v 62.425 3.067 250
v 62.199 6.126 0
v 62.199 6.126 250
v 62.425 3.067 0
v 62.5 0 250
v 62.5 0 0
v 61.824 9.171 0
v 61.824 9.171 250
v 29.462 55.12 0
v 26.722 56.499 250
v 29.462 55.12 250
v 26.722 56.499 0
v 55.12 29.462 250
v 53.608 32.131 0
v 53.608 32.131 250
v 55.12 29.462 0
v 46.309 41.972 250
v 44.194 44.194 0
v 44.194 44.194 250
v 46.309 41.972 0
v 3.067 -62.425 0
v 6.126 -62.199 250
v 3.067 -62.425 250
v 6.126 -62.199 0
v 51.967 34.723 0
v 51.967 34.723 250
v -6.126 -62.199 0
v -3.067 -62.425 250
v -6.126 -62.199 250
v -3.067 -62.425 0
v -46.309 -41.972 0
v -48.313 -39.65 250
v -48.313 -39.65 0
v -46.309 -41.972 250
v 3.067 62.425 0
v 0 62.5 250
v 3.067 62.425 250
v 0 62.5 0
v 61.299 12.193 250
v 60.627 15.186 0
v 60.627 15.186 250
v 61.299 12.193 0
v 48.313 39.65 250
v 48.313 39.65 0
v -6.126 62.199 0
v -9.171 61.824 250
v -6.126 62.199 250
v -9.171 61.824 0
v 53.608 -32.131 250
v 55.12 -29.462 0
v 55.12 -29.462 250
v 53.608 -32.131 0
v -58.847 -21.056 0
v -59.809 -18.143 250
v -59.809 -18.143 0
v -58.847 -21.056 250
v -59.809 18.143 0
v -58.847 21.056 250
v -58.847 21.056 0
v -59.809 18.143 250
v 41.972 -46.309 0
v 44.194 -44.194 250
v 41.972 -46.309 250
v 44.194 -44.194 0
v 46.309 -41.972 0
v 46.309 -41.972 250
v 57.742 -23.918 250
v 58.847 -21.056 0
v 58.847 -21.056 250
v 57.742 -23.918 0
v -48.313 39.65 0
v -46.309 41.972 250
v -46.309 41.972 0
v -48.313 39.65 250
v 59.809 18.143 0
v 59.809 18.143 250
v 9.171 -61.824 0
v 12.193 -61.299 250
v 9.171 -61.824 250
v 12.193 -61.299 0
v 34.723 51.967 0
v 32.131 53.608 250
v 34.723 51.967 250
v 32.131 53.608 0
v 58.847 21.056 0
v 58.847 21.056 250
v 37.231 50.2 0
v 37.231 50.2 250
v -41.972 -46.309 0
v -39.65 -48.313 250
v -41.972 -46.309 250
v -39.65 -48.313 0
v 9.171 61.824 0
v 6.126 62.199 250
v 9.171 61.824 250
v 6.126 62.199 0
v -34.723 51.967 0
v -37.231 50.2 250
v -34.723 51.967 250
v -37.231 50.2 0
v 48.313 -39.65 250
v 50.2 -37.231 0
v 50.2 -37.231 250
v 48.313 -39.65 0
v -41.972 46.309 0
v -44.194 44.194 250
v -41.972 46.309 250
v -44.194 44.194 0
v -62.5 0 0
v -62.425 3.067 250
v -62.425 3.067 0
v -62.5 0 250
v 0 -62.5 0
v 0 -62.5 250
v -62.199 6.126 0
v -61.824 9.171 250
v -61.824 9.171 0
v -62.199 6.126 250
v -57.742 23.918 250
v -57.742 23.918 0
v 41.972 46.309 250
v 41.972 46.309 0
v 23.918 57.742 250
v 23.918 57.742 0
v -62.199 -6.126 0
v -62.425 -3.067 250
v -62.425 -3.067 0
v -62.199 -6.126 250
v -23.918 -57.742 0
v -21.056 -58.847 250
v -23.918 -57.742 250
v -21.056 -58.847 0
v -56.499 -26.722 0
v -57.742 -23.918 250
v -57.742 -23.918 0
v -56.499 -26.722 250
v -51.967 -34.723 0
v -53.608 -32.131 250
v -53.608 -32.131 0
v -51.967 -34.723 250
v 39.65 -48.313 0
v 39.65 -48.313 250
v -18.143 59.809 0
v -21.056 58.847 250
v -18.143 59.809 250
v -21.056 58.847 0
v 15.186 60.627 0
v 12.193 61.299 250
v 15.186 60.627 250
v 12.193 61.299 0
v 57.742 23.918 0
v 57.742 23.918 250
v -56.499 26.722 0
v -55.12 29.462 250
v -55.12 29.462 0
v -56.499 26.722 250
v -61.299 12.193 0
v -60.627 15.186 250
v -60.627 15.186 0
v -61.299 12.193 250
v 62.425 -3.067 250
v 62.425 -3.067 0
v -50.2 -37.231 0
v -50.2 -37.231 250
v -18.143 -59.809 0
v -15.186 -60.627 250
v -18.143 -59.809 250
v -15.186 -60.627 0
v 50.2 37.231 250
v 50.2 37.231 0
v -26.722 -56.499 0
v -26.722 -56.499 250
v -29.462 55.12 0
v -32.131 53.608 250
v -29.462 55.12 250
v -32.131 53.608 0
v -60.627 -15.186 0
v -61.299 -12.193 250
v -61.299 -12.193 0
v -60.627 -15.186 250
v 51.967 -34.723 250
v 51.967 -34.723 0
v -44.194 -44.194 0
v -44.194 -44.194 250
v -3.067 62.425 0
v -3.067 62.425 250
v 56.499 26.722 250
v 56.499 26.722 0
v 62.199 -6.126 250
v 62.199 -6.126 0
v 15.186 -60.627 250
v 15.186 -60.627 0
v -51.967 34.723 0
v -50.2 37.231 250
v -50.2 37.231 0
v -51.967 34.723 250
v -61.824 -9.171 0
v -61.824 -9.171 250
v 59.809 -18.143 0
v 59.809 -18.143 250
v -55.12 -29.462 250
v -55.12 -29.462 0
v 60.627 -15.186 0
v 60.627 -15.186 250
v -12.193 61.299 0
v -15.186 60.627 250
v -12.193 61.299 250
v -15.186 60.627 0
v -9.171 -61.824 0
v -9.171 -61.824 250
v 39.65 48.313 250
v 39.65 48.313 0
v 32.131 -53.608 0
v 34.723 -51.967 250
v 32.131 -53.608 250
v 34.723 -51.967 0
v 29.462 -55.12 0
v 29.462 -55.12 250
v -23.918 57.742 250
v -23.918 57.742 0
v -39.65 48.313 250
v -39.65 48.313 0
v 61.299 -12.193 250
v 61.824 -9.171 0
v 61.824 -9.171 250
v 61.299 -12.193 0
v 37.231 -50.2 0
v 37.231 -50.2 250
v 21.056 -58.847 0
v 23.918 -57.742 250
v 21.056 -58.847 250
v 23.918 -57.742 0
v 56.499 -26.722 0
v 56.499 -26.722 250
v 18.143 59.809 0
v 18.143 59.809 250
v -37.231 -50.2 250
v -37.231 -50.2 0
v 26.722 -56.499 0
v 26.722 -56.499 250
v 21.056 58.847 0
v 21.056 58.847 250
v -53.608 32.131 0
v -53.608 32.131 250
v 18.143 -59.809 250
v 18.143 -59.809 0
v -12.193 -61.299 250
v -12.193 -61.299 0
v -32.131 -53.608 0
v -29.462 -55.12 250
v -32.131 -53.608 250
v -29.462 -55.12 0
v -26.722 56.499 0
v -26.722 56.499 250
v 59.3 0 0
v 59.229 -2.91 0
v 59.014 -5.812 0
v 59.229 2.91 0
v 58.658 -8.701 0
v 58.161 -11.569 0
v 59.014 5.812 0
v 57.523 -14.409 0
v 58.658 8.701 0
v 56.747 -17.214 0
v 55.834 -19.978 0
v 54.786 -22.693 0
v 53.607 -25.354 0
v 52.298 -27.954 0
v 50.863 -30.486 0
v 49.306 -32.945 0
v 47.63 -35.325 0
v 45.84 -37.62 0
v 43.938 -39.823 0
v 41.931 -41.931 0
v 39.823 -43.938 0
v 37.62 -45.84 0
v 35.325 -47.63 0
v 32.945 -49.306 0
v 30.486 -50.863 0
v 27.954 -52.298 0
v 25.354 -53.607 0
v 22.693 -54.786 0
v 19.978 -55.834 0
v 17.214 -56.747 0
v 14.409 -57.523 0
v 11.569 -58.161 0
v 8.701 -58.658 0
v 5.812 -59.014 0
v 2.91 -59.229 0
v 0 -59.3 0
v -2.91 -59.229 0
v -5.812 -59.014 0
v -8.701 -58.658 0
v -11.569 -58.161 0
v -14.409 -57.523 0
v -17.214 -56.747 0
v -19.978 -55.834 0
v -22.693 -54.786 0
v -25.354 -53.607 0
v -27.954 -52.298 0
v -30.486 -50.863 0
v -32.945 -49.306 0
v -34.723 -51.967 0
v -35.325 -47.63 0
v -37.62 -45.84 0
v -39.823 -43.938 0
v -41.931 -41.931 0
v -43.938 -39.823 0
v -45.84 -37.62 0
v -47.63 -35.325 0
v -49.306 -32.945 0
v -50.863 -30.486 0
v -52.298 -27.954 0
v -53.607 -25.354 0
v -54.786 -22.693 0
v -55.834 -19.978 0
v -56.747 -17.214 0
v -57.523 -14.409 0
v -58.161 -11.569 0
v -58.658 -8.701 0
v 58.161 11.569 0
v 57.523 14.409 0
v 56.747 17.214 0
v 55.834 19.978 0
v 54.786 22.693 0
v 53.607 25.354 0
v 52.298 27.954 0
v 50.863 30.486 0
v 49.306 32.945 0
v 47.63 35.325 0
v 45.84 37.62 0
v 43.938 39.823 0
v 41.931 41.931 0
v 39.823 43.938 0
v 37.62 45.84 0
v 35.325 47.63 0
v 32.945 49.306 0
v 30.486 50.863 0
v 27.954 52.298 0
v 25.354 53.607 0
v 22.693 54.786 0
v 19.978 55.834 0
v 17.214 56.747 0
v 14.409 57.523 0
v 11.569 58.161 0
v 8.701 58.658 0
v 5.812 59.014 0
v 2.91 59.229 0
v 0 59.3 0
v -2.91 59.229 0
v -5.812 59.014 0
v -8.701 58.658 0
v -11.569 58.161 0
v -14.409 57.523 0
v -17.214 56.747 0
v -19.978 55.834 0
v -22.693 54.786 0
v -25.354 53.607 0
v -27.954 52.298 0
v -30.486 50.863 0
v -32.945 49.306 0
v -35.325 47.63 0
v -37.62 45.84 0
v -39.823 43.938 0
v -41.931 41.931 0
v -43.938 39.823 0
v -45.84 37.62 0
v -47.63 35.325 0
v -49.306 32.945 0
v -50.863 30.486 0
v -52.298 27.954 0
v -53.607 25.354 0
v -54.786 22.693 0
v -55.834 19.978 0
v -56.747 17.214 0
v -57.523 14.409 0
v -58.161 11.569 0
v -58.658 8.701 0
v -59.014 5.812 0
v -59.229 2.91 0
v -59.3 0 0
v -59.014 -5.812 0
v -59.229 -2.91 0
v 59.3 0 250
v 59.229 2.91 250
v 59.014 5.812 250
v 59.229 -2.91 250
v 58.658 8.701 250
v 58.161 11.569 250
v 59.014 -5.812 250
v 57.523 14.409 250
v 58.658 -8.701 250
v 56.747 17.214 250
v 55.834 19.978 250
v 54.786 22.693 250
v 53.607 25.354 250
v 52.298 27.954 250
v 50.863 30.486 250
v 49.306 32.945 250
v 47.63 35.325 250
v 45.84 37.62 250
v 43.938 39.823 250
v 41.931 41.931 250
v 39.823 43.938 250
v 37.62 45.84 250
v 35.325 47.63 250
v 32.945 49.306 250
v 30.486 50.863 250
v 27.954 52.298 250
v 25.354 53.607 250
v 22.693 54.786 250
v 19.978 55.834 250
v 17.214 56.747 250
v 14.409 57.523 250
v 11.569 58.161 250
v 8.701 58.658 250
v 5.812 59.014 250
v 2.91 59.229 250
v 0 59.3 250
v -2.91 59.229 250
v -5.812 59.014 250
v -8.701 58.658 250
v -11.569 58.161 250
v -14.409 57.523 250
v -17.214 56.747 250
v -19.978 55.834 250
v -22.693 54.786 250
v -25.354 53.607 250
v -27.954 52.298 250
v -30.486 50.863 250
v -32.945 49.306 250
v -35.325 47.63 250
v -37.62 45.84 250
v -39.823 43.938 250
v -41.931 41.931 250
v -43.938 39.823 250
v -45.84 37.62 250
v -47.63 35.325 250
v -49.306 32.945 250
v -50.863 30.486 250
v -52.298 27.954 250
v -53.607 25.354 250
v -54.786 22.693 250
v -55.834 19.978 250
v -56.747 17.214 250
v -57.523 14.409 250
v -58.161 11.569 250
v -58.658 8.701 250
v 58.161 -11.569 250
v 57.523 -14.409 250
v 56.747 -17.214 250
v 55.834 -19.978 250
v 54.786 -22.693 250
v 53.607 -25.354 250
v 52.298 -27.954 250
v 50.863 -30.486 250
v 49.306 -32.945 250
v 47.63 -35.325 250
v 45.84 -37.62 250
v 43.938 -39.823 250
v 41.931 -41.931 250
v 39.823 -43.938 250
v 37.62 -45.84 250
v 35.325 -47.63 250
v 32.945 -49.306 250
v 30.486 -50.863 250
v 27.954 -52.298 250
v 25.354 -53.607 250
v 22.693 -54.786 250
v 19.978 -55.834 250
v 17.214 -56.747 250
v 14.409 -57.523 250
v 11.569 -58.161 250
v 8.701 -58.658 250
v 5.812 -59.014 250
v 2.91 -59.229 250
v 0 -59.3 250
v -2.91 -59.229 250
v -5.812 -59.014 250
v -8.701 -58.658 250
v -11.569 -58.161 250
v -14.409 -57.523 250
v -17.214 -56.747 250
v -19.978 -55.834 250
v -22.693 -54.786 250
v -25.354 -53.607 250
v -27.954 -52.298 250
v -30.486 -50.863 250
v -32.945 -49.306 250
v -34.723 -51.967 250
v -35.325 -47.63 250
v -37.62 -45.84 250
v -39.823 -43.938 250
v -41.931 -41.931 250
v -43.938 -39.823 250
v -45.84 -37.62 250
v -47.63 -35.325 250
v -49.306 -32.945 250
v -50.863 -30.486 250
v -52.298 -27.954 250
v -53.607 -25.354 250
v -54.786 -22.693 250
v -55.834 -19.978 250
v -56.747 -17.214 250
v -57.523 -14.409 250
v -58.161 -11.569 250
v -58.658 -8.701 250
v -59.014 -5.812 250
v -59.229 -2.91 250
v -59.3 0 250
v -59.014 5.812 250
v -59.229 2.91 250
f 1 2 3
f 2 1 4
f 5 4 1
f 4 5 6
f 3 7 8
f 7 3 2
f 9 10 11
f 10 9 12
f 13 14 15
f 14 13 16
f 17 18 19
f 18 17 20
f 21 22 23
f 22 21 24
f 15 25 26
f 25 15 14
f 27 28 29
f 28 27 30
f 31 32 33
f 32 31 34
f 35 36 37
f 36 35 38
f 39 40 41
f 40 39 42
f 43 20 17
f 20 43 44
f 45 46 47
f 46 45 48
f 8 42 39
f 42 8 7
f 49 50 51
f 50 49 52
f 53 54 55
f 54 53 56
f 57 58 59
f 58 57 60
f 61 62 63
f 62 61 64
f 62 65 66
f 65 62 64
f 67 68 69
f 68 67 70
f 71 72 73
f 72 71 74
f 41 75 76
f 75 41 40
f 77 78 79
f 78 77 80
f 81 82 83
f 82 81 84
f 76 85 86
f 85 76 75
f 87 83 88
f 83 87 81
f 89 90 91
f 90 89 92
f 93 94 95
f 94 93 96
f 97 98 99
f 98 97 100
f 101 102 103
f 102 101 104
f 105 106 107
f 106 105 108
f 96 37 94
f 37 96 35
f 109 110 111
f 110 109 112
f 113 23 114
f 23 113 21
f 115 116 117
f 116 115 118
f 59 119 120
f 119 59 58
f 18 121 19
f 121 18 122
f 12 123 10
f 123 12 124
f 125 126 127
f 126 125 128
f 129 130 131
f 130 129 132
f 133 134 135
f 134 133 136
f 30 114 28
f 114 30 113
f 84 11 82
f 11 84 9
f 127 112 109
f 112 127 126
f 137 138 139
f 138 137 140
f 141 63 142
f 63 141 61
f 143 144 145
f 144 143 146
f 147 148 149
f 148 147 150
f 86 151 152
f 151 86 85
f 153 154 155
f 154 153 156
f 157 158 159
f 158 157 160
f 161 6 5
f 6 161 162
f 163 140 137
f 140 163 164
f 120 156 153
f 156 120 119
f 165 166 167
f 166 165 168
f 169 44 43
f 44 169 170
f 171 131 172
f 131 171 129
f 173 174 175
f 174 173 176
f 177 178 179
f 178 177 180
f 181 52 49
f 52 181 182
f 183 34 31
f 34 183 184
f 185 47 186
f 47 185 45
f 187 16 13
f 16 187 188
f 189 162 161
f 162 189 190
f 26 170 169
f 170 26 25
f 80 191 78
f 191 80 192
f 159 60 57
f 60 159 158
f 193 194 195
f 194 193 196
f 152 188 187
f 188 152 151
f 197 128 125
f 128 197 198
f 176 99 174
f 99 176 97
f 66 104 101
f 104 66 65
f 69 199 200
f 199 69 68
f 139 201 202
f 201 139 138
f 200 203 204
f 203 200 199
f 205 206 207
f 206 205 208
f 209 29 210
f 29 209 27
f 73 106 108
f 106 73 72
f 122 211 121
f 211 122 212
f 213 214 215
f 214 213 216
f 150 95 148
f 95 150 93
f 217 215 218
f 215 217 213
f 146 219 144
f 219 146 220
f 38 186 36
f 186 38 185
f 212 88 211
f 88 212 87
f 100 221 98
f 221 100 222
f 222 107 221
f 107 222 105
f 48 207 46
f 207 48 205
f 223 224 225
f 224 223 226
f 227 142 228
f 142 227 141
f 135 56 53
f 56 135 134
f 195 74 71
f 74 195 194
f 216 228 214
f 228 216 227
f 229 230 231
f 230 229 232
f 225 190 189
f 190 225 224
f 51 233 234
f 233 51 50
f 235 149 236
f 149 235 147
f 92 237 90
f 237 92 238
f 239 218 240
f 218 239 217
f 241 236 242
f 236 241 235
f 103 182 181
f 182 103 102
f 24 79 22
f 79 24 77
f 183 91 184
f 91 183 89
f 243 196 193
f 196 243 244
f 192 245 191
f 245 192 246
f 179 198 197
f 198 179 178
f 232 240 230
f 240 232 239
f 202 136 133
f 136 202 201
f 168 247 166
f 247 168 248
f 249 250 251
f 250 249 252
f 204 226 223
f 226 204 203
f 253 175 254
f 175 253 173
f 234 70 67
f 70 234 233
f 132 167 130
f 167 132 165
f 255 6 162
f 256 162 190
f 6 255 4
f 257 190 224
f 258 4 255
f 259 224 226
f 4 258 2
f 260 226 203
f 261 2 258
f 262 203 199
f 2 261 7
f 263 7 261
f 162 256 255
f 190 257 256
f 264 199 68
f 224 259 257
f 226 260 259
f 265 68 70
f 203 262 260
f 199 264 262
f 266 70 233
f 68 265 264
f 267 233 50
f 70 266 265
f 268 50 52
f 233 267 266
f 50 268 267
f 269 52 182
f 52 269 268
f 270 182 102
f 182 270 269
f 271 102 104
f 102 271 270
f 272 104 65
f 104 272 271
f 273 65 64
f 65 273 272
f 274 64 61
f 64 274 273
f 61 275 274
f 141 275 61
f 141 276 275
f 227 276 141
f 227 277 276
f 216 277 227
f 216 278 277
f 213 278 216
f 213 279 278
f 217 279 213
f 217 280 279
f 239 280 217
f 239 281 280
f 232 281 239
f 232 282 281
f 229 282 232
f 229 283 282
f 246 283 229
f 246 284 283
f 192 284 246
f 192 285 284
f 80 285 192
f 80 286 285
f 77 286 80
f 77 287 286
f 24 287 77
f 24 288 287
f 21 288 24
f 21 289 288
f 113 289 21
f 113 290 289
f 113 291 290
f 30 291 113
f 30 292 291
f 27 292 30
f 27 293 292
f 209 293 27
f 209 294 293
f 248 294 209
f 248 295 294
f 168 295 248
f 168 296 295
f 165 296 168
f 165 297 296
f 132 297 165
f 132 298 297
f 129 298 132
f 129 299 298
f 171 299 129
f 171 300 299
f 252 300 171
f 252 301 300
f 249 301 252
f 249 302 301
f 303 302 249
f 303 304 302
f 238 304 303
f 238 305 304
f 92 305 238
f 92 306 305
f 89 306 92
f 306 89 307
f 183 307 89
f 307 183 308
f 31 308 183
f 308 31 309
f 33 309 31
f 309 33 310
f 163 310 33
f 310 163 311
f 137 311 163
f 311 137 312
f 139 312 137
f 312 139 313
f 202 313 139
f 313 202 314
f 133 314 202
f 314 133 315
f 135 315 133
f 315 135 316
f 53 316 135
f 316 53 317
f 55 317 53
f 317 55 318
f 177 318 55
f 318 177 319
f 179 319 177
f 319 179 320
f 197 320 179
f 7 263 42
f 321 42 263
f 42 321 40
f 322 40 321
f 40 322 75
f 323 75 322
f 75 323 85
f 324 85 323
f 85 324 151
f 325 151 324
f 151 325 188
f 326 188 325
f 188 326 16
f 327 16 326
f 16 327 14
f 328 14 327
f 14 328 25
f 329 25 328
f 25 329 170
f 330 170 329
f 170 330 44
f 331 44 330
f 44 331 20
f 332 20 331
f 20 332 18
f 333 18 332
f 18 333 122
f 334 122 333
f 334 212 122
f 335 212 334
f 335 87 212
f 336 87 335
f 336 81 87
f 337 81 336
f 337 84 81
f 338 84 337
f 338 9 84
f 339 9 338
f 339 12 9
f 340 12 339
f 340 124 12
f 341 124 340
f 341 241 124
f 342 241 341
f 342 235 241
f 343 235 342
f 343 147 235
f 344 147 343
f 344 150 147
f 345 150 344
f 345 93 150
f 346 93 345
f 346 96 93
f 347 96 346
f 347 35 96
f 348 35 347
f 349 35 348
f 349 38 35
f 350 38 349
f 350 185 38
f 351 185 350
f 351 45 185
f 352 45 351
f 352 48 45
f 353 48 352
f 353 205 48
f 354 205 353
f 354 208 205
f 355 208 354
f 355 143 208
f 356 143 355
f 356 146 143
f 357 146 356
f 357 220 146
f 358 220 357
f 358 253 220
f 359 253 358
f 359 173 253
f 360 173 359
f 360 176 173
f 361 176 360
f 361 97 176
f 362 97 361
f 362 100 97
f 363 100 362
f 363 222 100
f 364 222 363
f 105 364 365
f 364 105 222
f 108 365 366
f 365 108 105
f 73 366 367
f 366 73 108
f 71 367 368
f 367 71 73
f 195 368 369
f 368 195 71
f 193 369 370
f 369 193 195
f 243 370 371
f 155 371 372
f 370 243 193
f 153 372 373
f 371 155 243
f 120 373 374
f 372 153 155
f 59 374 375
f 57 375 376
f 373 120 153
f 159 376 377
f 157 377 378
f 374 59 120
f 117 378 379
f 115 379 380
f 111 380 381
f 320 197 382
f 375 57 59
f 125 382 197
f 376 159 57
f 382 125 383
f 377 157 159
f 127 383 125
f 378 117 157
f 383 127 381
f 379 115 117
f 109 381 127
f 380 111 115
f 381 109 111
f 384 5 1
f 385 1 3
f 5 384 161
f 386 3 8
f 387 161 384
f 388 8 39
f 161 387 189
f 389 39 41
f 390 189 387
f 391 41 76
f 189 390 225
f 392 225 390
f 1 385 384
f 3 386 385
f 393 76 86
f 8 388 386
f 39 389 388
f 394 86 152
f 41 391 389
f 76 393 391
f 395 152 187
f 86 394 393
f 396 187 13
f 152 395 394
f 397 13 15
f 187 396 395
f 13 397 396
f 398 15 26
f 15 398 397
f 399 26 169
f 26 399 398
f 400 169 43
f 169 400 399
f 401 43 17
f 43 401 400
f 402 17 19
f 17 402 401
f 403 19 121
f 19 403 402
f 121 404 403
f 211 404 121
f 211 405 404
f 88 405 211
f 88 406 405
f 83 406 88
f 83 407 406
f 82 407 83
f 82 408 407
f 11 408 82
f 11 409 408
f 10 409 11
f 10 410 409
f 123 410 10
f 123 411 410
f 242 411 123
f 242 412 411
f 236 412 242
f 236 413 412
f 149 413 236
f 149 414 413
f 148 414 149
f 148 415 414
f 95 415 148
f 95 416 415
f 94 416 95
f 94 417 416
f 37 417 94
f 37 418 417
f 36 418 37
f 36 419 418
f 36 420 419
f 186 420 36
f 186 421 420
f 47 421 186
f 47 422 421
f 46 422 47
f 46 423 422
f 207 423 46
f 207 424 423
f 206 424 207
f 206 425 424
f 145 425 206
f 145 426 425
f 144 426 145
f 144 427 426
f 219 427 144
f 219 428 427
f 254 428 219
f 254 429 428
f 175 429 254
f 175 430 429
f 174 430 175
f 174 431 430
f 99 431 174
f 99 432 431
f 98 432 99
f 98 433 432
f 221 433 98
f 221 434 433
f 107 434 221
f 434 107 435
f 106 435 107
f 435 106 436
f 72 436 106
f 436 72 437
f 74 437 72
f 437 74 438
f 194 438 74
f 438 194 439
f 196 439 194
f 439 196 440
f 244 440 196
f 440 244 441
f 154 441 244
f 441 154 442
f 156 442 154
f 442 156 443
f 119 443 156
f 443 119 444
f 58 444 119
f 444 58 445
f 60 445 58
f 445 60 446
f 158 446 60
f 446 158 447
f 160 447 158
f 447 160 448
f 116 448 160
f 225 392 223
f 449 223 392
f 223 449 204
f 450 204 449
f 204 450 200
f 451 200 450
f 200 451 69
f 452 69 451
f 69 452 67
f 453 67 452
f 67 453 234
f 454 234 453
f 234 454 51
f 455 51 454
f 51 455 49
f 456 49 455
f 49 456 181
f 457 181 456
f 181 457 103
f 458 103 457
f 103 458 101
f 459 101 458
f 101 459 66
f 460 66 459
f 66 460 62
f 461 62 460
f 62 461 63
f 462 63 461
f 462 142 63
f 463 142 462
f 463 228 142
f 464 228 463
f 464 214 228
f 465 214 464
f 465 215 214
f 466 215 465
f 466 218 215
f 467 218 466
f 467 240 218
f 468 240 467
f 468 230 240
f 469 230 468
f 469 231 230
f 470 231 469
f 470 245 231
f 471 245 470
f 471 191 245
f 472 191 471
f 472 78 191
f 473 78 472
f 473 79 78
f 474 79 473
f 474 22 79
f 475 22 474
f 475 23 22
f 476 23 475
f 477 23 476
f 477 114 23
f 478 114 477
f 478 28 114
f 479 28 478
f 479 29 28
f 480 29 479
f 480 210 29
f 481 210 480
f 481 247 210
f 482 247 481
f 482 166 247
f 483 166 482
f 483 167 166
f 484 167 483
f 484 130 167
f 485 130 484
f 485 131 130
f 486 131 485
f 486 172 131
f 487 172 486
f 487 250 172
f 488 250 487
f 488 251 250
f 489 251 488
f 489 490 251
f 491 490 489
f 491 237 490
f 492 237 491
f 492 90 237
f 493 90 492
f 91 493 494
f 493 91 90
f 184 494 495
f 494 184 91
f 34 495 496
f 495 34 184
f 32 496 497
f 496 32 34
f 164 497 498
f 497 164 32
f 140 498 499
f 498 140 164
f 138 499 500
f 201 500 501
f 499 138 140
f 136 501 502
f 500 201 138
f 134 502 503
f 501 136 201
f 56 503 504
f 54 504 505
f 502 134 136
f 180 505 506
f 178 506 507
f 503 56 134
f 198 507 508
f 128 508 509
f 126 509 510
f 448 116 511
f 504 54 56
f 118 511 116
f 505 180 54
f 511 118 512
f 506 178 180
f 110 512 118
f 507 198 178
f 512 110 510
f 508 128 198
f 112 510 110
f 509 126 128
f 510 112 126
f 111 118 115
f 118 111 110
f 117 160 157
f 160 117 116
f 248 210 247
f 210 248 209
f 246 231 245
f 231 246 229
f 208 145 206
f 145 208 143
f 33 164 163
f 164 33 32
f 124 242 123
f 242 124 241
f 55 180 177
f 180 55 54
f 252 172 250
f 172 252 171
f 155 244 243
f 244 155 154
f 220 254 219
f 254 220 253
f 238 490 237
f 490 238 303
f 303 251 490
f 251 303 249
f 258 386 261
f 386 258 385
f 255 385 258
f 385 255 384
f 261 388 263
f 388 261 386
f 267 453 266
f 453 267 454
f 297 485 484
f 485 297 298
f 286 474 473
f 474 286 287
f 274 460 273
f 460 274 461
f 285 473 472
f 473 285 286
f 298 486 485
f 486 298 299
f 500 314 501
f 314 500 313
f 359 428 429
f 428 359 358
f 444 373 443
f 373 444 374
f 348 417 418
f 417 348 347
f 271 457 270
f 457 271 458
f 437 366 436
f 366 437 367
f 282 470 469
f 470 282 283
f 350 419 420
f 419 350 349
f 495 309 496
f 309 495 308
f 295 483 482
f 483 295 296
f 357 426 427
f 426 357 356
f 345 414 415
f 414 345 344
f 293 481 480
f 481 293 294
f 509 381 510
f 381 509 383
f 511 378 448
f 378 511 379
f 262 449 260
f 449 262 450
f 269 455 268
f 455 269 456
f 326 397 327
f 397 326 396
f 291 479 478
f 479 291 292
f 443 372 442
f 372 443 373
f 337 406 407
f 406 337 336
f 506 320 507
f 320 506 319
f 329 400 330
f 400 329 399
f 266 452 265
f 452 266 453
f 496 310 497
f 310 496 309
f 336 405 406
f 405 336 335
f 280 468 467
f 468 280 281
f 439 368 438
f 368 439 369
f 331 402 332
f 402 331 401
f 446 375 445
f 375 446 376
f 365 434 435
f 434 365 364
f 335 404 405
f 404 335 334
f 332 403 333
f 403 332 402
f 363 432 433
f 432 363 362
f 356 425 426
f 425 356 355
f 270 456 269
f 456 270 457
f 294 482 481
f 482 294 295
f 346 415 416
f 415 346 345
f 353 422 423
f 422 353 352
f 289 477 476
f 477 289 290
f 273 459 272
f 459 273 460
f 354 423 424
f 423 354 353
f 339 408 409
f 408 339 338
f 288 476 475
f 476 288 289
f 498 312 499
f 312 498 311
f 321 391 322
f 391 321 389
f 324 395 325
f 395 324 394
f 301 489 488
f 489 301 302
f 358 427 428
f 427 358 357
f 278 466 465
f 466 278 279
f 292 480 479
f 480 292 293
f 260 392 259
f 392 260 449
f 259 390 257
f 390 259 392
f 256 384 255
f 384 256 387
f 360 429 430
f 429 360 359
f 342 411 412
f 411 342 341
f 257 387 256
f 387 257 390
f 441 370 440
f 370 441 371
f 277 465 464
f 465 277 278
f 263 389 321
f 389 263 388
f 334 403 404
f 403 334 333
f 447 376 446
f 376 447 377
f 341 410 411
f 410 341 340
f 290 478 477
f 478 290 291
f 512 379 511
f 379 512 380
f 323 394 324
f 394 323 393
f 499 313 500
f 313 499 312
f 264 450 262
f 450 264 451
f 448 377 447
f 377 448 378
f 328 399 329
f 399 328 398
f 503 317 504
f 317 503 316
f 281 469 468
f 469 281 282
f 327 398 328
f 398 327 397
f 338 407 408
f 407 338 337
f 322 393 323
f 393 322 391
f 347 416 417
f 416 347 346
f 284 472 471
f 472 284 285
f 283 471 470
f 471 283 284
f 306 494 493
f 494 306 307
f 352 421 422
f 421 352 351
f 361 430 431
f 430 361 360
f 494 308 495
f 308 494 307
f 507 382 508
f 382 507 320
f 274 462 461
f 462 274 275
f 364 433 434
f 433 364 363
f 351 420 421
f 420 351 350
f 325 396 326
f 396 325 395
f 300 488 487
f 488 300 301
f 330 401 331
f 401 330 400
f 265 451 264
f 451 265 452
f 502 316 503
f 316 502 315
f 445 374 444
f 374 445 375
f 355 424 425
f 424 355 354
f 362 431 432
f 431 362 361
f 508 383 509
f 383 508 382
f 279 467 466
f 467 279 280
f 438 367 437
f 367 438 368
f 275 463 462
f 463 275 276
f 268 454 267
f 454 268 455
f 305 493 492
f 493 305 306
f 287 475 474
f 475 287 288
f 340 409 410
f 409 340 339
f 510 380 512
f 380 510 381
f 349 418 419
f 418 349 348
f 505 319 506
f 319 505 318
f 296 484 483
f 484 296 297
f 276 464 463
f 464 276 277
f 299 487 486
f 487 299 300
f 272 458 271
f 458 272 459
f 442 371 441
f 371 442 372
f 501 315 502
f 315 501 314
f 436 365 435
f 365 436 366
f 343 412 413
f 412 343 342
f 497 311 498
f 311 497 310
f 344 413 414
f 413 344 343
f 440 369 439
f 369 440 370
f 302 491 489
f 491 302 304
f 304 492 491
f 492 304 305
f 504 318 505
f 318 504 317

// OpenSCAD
$fn = 128;

// HT pipe: DN 125, length 250 mm (approximate typical dimensions)
dn = 125;                 // nominal diameter (mm)
L  = 250;                 // length (mm)

// Typical HT (PP) pipe wall thickness for DN125 is ~3.2 mm (approx.)
t = 3.2;                  // wall thickness (mm)

OD = dn;                  // assume outer diameter equals nominal for this simplified model
ID = OD - 2*t;

module ht_pipe(od, id, len) {
    difference() {
        cylinder(h = len, d = od);
        translate([0,0,-0.5])
            cylinder(h = len + 1.0, d = id);
    }
}

ht_pipe(OD, ID, L);
